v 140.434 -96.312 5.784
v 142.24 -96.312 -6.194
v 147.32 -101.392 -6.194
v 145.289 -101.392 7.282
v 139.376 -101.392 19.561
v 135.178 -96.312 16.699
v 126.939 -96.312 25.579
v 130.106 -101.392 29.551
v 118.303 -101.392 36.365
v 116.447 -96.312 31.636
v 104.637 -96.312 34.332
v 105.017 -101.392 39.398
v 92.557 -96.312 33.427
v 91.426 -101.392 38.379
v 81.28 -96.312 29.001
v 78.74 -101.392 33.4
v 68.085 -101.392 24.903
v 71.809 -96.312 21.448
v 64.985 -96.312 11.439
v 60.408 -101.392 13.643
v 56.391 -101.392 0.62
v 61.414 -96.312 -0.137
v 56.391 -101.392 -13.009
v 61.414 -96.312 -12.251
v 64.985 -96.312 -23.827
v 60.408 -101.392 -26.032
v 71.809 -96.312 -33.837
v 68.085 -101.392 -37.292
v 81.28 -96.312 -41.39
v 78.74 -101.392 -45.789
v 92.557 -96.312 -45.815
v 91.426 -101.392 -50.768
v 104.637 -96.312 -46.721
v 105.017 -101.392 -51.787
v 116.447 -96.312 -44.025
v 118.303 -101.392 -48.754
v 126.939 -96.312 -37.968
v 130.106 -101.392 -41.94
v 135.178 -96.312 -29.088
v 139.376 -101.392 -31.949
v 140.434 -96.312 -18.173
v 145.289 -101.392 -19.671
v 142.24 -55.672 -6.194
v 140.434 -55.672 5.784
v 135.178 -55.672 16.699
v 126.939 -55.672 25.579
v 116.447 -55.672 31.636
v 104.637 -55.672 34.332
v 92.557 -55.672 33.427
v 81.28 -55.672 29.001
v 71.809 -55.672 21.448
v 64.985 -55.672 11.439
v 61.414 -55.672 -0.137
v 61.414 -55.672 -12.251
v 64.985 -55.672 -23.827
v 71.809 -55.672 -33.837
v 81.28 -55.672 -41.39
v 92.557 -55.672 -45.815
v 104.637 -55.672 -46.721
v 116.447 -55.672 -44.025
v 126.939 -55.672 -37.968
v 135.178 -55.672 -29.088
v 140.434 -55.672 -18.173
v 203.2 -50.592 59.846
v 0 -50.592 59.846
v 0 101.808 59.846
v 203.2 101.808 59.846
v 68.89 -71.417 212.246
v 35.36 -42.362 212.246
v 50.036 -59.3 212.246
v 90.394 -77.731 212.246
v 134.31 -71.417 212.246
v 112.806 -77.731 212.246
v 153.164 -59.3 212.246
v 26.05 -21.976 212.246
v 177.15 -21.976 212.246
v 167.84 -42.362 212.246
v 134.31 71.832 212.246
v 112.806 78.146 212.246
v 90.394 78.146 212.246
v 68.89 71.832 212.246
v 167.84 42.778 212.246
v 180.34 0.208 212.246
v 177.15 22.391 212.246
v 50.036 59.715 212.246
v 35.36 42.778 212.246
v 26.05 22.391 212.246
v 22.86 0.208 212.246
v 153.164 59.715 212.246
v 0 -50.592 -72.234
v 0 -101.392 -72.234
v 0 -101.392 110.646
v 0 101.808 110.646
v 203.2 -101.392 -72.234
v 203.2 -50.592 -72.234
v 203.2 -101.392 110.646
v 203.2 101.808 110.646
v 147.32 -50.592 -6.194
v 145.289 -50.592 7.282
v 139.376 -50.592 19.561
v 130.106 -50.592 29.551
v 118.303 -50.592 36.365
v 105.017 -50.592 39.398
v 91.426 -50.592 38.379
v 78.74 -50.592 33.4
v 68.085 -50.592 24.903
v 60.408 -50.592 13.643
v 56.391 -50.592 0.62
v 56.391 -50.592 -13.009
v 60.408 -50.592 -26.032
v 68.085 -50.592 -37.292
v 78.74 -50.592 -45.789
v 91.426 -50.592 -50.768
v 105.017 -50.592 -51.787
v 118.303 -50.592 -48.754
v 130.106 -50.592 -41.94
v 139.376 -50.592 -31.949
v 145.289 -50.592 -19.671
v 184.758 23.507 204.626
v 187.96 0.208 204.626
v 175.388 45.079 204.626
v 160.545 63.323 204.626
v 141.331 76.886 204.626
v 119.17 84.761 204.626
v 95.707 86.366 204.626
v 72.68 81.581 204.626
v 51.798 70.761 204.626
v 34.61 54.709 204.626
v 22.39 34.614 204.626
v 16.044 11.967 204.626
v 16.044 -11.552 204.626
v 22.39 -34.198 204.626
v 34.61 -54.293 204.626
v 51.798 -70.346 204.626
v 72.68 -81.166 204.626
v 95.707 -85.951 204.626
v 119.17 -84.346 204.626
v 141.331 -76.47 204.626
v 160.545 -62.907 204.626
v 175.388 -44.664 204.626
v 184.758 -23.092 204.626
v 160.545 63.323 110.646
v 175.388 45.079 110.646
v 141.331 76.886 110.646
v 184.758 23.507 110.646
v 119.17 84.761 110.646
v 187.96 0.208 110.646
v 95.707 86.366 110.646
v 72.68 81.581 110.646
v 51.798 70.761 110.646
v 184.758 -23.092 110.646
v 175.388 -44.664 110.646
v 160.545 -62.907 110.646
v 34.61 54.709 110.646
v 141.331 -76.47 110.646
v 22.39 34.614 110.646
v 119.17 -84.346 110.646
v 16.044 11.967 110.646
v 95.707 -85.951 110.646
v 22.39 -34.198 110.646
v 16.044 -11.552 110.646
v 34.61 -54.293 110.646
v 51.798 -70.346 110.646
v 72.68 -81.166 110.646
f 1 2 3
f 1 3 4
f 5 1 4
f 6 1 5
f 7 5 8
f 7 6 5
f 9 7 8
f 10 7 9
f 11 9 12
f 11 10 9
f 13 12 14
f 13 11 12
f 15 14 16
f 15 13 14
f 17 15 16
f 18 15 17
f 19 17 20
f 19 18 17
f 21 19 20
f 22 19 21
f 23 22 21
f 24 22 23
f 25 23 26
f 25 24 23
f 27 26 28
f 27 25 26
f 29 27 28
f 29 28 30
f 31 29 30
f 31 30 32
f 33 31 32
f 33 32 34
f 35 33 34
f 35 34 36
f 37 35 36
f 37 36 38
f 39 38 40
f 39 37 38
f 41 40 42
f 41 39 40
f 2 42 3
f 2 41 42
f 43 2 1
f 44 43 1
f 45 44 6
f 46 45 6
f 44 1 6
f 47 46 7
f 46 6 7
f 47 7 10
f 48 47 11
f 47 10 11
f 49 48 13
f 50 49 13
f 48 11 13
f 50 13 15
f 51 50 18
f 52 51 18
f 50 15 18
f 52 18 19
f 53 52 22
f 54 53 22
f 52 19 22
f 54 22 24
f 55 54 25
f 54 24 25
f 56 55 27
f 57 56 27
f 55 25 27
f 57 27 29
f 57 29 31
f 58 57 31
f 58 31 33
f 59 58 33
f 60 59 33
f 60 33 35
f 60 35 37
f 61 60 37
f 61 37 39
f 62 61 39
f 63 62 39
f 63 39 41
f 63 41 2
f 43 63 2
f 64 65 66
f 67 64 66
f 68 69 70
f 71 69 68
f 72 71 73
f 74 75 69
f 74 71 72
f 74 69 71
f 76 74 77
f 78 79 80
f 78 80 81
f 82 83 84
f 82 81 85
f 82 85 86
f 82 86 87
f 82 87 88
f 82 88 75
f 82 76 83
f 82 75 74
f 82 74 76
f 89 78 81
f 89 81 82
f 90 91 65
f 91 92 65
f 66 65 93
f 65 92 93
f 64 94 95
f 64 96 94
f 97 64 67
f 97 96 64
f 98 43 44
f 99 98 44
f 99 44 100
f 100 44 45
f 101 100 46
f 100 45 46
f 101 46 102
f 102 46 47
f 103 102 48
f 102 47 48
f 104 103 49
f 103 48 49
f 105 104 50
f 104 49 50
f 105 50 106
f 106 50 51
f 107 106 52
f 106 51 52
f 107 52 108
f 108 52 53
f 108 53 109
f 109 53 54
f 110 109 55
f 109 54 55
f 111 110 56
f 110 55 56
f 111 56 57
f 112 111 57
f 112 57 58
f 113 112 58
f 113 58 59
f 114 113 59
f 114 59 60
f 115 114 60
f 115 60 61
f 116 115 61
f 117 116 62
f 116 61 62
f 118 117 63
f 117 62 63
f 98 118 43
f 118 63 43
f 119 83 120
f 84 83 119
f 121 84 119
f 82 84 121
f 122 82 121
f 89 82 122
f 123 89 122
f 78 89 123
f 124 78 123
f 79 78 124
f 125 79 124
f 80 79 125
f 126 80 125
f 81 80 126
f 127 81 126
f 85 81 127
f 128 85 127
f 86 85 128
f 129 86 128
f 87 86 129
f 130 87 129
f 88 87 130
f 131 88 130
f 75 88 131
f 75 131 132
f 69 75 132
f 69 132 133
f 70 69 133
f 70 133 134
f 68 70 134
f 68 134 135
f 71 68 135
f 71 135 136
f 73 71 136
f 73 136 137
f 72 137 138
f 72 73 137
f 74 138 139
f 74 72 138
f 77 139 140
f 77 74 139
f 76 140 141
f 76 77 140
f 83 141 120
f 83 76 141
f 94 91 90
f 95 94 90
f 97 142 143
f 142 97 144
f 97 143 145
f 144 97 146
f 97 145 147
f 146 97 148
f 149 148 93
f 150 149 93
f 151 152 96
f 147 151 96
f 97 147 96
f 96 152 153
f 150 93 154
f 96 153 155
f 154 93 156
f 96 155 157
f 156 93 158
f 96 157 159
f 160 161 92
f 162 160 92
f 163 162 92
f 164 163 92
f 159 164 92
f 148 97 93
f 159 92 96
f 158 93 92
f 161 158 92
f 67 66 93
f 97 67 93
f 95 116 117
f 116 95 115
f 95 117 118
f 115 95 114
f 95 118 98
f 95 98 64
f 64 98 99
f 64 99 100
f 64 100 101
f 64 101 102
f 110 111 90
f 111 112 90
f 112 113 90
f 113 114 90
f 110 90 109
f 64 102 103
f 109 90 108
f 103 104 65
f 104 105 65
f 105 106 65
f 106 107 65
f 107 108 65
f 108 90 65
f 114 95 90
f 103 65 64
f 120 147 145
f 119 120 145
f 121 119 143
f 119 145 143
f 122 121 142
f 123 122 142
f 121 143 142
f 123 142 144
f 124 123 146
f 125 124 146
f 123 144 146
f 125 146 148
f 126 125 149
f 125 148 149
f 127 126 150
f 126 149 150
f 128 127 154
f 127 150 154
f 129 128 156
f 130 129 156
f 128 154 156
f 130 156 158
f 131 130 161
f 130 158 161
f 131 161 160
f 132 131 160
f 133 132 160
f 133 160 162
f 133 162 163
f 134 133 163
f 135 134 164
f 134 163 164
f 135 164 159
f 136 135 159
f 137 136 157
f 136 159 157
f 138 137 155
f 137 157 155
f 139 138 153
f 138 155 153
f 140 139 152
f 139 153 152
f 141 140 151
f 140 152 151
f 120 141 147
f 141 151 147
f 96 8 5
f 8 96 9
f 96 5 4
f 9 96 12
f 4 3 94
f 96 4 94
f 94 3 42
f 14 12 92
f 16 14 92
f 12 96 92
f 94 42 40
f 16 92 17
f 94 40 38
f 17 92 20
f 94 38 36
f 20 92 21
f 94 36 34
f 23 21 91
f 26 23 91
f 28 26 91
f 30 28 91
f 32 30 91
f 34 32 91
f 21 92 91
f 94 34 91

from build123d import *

# Parameters (mm, degrees)
F1_DEPTH = 203.2
F2_R     = 40.64
F3_DEPTH = 635
F4_R     = 86.36
F5_DEPTH = 101.6
F6_SIZE2 = 7.62
F6_SIZE  = 7.62
F7_SIZE2 = 5.08
F7_SIZE  = 5.08


with BuildPart() as f1:
    # F0 (on Right) → F1 (new body)
    with BuildSketch(Plane.YZ):
        Polygon((-101.3922498733, -72.2344086301), (-50.5922498733, -72.2344086301), (-50.5922498733, 59.8455913699), (101.8077501267, 59.8455913699), (101.8077501267, 110.6455913699), (-101.3922498733, 110.6455913699), align=None)
    extrude(amount=F1_DEPTH)

    # F2 (on face) → F3 (cut)
    with BuildSketch(Plane.XZ.offset(101.3922498733)):
        with Locations((101.6, -6.1944086301)):
            Circle(F2_R)
    extrude(amount=-F3_DEPTH, mode=Mode.SUBTRACT)

    # F4 (on face) → F5 (join)
    with BuildSketch(Plane.XY.offset(110.6455913699)):
        with Locations((101.6, 0.2077501267)):
            Circle(F4_R)
    extrude(amount=F5_DEPTH)

    # F6
    f6_edges = [f1.edges().sort_by_distance(p)[0] for p in [
        (15.24, 0.20775, 212.245591),
    ]]
    chamfer(f6_edges, length=F6_SIZE, length2=F6_SIZE2)

    # F7
    f7_edges = [f1.edges().sort_by_distance(p)[0] for p in [
        (60.96, -101.39225, -6.194409),
        (60.96, -50.59225, -6.194409),
    ]]
    chamfer(f7_edges, length=F7_SIZE, length2=F7_SIZE2)


solid = f1.part
